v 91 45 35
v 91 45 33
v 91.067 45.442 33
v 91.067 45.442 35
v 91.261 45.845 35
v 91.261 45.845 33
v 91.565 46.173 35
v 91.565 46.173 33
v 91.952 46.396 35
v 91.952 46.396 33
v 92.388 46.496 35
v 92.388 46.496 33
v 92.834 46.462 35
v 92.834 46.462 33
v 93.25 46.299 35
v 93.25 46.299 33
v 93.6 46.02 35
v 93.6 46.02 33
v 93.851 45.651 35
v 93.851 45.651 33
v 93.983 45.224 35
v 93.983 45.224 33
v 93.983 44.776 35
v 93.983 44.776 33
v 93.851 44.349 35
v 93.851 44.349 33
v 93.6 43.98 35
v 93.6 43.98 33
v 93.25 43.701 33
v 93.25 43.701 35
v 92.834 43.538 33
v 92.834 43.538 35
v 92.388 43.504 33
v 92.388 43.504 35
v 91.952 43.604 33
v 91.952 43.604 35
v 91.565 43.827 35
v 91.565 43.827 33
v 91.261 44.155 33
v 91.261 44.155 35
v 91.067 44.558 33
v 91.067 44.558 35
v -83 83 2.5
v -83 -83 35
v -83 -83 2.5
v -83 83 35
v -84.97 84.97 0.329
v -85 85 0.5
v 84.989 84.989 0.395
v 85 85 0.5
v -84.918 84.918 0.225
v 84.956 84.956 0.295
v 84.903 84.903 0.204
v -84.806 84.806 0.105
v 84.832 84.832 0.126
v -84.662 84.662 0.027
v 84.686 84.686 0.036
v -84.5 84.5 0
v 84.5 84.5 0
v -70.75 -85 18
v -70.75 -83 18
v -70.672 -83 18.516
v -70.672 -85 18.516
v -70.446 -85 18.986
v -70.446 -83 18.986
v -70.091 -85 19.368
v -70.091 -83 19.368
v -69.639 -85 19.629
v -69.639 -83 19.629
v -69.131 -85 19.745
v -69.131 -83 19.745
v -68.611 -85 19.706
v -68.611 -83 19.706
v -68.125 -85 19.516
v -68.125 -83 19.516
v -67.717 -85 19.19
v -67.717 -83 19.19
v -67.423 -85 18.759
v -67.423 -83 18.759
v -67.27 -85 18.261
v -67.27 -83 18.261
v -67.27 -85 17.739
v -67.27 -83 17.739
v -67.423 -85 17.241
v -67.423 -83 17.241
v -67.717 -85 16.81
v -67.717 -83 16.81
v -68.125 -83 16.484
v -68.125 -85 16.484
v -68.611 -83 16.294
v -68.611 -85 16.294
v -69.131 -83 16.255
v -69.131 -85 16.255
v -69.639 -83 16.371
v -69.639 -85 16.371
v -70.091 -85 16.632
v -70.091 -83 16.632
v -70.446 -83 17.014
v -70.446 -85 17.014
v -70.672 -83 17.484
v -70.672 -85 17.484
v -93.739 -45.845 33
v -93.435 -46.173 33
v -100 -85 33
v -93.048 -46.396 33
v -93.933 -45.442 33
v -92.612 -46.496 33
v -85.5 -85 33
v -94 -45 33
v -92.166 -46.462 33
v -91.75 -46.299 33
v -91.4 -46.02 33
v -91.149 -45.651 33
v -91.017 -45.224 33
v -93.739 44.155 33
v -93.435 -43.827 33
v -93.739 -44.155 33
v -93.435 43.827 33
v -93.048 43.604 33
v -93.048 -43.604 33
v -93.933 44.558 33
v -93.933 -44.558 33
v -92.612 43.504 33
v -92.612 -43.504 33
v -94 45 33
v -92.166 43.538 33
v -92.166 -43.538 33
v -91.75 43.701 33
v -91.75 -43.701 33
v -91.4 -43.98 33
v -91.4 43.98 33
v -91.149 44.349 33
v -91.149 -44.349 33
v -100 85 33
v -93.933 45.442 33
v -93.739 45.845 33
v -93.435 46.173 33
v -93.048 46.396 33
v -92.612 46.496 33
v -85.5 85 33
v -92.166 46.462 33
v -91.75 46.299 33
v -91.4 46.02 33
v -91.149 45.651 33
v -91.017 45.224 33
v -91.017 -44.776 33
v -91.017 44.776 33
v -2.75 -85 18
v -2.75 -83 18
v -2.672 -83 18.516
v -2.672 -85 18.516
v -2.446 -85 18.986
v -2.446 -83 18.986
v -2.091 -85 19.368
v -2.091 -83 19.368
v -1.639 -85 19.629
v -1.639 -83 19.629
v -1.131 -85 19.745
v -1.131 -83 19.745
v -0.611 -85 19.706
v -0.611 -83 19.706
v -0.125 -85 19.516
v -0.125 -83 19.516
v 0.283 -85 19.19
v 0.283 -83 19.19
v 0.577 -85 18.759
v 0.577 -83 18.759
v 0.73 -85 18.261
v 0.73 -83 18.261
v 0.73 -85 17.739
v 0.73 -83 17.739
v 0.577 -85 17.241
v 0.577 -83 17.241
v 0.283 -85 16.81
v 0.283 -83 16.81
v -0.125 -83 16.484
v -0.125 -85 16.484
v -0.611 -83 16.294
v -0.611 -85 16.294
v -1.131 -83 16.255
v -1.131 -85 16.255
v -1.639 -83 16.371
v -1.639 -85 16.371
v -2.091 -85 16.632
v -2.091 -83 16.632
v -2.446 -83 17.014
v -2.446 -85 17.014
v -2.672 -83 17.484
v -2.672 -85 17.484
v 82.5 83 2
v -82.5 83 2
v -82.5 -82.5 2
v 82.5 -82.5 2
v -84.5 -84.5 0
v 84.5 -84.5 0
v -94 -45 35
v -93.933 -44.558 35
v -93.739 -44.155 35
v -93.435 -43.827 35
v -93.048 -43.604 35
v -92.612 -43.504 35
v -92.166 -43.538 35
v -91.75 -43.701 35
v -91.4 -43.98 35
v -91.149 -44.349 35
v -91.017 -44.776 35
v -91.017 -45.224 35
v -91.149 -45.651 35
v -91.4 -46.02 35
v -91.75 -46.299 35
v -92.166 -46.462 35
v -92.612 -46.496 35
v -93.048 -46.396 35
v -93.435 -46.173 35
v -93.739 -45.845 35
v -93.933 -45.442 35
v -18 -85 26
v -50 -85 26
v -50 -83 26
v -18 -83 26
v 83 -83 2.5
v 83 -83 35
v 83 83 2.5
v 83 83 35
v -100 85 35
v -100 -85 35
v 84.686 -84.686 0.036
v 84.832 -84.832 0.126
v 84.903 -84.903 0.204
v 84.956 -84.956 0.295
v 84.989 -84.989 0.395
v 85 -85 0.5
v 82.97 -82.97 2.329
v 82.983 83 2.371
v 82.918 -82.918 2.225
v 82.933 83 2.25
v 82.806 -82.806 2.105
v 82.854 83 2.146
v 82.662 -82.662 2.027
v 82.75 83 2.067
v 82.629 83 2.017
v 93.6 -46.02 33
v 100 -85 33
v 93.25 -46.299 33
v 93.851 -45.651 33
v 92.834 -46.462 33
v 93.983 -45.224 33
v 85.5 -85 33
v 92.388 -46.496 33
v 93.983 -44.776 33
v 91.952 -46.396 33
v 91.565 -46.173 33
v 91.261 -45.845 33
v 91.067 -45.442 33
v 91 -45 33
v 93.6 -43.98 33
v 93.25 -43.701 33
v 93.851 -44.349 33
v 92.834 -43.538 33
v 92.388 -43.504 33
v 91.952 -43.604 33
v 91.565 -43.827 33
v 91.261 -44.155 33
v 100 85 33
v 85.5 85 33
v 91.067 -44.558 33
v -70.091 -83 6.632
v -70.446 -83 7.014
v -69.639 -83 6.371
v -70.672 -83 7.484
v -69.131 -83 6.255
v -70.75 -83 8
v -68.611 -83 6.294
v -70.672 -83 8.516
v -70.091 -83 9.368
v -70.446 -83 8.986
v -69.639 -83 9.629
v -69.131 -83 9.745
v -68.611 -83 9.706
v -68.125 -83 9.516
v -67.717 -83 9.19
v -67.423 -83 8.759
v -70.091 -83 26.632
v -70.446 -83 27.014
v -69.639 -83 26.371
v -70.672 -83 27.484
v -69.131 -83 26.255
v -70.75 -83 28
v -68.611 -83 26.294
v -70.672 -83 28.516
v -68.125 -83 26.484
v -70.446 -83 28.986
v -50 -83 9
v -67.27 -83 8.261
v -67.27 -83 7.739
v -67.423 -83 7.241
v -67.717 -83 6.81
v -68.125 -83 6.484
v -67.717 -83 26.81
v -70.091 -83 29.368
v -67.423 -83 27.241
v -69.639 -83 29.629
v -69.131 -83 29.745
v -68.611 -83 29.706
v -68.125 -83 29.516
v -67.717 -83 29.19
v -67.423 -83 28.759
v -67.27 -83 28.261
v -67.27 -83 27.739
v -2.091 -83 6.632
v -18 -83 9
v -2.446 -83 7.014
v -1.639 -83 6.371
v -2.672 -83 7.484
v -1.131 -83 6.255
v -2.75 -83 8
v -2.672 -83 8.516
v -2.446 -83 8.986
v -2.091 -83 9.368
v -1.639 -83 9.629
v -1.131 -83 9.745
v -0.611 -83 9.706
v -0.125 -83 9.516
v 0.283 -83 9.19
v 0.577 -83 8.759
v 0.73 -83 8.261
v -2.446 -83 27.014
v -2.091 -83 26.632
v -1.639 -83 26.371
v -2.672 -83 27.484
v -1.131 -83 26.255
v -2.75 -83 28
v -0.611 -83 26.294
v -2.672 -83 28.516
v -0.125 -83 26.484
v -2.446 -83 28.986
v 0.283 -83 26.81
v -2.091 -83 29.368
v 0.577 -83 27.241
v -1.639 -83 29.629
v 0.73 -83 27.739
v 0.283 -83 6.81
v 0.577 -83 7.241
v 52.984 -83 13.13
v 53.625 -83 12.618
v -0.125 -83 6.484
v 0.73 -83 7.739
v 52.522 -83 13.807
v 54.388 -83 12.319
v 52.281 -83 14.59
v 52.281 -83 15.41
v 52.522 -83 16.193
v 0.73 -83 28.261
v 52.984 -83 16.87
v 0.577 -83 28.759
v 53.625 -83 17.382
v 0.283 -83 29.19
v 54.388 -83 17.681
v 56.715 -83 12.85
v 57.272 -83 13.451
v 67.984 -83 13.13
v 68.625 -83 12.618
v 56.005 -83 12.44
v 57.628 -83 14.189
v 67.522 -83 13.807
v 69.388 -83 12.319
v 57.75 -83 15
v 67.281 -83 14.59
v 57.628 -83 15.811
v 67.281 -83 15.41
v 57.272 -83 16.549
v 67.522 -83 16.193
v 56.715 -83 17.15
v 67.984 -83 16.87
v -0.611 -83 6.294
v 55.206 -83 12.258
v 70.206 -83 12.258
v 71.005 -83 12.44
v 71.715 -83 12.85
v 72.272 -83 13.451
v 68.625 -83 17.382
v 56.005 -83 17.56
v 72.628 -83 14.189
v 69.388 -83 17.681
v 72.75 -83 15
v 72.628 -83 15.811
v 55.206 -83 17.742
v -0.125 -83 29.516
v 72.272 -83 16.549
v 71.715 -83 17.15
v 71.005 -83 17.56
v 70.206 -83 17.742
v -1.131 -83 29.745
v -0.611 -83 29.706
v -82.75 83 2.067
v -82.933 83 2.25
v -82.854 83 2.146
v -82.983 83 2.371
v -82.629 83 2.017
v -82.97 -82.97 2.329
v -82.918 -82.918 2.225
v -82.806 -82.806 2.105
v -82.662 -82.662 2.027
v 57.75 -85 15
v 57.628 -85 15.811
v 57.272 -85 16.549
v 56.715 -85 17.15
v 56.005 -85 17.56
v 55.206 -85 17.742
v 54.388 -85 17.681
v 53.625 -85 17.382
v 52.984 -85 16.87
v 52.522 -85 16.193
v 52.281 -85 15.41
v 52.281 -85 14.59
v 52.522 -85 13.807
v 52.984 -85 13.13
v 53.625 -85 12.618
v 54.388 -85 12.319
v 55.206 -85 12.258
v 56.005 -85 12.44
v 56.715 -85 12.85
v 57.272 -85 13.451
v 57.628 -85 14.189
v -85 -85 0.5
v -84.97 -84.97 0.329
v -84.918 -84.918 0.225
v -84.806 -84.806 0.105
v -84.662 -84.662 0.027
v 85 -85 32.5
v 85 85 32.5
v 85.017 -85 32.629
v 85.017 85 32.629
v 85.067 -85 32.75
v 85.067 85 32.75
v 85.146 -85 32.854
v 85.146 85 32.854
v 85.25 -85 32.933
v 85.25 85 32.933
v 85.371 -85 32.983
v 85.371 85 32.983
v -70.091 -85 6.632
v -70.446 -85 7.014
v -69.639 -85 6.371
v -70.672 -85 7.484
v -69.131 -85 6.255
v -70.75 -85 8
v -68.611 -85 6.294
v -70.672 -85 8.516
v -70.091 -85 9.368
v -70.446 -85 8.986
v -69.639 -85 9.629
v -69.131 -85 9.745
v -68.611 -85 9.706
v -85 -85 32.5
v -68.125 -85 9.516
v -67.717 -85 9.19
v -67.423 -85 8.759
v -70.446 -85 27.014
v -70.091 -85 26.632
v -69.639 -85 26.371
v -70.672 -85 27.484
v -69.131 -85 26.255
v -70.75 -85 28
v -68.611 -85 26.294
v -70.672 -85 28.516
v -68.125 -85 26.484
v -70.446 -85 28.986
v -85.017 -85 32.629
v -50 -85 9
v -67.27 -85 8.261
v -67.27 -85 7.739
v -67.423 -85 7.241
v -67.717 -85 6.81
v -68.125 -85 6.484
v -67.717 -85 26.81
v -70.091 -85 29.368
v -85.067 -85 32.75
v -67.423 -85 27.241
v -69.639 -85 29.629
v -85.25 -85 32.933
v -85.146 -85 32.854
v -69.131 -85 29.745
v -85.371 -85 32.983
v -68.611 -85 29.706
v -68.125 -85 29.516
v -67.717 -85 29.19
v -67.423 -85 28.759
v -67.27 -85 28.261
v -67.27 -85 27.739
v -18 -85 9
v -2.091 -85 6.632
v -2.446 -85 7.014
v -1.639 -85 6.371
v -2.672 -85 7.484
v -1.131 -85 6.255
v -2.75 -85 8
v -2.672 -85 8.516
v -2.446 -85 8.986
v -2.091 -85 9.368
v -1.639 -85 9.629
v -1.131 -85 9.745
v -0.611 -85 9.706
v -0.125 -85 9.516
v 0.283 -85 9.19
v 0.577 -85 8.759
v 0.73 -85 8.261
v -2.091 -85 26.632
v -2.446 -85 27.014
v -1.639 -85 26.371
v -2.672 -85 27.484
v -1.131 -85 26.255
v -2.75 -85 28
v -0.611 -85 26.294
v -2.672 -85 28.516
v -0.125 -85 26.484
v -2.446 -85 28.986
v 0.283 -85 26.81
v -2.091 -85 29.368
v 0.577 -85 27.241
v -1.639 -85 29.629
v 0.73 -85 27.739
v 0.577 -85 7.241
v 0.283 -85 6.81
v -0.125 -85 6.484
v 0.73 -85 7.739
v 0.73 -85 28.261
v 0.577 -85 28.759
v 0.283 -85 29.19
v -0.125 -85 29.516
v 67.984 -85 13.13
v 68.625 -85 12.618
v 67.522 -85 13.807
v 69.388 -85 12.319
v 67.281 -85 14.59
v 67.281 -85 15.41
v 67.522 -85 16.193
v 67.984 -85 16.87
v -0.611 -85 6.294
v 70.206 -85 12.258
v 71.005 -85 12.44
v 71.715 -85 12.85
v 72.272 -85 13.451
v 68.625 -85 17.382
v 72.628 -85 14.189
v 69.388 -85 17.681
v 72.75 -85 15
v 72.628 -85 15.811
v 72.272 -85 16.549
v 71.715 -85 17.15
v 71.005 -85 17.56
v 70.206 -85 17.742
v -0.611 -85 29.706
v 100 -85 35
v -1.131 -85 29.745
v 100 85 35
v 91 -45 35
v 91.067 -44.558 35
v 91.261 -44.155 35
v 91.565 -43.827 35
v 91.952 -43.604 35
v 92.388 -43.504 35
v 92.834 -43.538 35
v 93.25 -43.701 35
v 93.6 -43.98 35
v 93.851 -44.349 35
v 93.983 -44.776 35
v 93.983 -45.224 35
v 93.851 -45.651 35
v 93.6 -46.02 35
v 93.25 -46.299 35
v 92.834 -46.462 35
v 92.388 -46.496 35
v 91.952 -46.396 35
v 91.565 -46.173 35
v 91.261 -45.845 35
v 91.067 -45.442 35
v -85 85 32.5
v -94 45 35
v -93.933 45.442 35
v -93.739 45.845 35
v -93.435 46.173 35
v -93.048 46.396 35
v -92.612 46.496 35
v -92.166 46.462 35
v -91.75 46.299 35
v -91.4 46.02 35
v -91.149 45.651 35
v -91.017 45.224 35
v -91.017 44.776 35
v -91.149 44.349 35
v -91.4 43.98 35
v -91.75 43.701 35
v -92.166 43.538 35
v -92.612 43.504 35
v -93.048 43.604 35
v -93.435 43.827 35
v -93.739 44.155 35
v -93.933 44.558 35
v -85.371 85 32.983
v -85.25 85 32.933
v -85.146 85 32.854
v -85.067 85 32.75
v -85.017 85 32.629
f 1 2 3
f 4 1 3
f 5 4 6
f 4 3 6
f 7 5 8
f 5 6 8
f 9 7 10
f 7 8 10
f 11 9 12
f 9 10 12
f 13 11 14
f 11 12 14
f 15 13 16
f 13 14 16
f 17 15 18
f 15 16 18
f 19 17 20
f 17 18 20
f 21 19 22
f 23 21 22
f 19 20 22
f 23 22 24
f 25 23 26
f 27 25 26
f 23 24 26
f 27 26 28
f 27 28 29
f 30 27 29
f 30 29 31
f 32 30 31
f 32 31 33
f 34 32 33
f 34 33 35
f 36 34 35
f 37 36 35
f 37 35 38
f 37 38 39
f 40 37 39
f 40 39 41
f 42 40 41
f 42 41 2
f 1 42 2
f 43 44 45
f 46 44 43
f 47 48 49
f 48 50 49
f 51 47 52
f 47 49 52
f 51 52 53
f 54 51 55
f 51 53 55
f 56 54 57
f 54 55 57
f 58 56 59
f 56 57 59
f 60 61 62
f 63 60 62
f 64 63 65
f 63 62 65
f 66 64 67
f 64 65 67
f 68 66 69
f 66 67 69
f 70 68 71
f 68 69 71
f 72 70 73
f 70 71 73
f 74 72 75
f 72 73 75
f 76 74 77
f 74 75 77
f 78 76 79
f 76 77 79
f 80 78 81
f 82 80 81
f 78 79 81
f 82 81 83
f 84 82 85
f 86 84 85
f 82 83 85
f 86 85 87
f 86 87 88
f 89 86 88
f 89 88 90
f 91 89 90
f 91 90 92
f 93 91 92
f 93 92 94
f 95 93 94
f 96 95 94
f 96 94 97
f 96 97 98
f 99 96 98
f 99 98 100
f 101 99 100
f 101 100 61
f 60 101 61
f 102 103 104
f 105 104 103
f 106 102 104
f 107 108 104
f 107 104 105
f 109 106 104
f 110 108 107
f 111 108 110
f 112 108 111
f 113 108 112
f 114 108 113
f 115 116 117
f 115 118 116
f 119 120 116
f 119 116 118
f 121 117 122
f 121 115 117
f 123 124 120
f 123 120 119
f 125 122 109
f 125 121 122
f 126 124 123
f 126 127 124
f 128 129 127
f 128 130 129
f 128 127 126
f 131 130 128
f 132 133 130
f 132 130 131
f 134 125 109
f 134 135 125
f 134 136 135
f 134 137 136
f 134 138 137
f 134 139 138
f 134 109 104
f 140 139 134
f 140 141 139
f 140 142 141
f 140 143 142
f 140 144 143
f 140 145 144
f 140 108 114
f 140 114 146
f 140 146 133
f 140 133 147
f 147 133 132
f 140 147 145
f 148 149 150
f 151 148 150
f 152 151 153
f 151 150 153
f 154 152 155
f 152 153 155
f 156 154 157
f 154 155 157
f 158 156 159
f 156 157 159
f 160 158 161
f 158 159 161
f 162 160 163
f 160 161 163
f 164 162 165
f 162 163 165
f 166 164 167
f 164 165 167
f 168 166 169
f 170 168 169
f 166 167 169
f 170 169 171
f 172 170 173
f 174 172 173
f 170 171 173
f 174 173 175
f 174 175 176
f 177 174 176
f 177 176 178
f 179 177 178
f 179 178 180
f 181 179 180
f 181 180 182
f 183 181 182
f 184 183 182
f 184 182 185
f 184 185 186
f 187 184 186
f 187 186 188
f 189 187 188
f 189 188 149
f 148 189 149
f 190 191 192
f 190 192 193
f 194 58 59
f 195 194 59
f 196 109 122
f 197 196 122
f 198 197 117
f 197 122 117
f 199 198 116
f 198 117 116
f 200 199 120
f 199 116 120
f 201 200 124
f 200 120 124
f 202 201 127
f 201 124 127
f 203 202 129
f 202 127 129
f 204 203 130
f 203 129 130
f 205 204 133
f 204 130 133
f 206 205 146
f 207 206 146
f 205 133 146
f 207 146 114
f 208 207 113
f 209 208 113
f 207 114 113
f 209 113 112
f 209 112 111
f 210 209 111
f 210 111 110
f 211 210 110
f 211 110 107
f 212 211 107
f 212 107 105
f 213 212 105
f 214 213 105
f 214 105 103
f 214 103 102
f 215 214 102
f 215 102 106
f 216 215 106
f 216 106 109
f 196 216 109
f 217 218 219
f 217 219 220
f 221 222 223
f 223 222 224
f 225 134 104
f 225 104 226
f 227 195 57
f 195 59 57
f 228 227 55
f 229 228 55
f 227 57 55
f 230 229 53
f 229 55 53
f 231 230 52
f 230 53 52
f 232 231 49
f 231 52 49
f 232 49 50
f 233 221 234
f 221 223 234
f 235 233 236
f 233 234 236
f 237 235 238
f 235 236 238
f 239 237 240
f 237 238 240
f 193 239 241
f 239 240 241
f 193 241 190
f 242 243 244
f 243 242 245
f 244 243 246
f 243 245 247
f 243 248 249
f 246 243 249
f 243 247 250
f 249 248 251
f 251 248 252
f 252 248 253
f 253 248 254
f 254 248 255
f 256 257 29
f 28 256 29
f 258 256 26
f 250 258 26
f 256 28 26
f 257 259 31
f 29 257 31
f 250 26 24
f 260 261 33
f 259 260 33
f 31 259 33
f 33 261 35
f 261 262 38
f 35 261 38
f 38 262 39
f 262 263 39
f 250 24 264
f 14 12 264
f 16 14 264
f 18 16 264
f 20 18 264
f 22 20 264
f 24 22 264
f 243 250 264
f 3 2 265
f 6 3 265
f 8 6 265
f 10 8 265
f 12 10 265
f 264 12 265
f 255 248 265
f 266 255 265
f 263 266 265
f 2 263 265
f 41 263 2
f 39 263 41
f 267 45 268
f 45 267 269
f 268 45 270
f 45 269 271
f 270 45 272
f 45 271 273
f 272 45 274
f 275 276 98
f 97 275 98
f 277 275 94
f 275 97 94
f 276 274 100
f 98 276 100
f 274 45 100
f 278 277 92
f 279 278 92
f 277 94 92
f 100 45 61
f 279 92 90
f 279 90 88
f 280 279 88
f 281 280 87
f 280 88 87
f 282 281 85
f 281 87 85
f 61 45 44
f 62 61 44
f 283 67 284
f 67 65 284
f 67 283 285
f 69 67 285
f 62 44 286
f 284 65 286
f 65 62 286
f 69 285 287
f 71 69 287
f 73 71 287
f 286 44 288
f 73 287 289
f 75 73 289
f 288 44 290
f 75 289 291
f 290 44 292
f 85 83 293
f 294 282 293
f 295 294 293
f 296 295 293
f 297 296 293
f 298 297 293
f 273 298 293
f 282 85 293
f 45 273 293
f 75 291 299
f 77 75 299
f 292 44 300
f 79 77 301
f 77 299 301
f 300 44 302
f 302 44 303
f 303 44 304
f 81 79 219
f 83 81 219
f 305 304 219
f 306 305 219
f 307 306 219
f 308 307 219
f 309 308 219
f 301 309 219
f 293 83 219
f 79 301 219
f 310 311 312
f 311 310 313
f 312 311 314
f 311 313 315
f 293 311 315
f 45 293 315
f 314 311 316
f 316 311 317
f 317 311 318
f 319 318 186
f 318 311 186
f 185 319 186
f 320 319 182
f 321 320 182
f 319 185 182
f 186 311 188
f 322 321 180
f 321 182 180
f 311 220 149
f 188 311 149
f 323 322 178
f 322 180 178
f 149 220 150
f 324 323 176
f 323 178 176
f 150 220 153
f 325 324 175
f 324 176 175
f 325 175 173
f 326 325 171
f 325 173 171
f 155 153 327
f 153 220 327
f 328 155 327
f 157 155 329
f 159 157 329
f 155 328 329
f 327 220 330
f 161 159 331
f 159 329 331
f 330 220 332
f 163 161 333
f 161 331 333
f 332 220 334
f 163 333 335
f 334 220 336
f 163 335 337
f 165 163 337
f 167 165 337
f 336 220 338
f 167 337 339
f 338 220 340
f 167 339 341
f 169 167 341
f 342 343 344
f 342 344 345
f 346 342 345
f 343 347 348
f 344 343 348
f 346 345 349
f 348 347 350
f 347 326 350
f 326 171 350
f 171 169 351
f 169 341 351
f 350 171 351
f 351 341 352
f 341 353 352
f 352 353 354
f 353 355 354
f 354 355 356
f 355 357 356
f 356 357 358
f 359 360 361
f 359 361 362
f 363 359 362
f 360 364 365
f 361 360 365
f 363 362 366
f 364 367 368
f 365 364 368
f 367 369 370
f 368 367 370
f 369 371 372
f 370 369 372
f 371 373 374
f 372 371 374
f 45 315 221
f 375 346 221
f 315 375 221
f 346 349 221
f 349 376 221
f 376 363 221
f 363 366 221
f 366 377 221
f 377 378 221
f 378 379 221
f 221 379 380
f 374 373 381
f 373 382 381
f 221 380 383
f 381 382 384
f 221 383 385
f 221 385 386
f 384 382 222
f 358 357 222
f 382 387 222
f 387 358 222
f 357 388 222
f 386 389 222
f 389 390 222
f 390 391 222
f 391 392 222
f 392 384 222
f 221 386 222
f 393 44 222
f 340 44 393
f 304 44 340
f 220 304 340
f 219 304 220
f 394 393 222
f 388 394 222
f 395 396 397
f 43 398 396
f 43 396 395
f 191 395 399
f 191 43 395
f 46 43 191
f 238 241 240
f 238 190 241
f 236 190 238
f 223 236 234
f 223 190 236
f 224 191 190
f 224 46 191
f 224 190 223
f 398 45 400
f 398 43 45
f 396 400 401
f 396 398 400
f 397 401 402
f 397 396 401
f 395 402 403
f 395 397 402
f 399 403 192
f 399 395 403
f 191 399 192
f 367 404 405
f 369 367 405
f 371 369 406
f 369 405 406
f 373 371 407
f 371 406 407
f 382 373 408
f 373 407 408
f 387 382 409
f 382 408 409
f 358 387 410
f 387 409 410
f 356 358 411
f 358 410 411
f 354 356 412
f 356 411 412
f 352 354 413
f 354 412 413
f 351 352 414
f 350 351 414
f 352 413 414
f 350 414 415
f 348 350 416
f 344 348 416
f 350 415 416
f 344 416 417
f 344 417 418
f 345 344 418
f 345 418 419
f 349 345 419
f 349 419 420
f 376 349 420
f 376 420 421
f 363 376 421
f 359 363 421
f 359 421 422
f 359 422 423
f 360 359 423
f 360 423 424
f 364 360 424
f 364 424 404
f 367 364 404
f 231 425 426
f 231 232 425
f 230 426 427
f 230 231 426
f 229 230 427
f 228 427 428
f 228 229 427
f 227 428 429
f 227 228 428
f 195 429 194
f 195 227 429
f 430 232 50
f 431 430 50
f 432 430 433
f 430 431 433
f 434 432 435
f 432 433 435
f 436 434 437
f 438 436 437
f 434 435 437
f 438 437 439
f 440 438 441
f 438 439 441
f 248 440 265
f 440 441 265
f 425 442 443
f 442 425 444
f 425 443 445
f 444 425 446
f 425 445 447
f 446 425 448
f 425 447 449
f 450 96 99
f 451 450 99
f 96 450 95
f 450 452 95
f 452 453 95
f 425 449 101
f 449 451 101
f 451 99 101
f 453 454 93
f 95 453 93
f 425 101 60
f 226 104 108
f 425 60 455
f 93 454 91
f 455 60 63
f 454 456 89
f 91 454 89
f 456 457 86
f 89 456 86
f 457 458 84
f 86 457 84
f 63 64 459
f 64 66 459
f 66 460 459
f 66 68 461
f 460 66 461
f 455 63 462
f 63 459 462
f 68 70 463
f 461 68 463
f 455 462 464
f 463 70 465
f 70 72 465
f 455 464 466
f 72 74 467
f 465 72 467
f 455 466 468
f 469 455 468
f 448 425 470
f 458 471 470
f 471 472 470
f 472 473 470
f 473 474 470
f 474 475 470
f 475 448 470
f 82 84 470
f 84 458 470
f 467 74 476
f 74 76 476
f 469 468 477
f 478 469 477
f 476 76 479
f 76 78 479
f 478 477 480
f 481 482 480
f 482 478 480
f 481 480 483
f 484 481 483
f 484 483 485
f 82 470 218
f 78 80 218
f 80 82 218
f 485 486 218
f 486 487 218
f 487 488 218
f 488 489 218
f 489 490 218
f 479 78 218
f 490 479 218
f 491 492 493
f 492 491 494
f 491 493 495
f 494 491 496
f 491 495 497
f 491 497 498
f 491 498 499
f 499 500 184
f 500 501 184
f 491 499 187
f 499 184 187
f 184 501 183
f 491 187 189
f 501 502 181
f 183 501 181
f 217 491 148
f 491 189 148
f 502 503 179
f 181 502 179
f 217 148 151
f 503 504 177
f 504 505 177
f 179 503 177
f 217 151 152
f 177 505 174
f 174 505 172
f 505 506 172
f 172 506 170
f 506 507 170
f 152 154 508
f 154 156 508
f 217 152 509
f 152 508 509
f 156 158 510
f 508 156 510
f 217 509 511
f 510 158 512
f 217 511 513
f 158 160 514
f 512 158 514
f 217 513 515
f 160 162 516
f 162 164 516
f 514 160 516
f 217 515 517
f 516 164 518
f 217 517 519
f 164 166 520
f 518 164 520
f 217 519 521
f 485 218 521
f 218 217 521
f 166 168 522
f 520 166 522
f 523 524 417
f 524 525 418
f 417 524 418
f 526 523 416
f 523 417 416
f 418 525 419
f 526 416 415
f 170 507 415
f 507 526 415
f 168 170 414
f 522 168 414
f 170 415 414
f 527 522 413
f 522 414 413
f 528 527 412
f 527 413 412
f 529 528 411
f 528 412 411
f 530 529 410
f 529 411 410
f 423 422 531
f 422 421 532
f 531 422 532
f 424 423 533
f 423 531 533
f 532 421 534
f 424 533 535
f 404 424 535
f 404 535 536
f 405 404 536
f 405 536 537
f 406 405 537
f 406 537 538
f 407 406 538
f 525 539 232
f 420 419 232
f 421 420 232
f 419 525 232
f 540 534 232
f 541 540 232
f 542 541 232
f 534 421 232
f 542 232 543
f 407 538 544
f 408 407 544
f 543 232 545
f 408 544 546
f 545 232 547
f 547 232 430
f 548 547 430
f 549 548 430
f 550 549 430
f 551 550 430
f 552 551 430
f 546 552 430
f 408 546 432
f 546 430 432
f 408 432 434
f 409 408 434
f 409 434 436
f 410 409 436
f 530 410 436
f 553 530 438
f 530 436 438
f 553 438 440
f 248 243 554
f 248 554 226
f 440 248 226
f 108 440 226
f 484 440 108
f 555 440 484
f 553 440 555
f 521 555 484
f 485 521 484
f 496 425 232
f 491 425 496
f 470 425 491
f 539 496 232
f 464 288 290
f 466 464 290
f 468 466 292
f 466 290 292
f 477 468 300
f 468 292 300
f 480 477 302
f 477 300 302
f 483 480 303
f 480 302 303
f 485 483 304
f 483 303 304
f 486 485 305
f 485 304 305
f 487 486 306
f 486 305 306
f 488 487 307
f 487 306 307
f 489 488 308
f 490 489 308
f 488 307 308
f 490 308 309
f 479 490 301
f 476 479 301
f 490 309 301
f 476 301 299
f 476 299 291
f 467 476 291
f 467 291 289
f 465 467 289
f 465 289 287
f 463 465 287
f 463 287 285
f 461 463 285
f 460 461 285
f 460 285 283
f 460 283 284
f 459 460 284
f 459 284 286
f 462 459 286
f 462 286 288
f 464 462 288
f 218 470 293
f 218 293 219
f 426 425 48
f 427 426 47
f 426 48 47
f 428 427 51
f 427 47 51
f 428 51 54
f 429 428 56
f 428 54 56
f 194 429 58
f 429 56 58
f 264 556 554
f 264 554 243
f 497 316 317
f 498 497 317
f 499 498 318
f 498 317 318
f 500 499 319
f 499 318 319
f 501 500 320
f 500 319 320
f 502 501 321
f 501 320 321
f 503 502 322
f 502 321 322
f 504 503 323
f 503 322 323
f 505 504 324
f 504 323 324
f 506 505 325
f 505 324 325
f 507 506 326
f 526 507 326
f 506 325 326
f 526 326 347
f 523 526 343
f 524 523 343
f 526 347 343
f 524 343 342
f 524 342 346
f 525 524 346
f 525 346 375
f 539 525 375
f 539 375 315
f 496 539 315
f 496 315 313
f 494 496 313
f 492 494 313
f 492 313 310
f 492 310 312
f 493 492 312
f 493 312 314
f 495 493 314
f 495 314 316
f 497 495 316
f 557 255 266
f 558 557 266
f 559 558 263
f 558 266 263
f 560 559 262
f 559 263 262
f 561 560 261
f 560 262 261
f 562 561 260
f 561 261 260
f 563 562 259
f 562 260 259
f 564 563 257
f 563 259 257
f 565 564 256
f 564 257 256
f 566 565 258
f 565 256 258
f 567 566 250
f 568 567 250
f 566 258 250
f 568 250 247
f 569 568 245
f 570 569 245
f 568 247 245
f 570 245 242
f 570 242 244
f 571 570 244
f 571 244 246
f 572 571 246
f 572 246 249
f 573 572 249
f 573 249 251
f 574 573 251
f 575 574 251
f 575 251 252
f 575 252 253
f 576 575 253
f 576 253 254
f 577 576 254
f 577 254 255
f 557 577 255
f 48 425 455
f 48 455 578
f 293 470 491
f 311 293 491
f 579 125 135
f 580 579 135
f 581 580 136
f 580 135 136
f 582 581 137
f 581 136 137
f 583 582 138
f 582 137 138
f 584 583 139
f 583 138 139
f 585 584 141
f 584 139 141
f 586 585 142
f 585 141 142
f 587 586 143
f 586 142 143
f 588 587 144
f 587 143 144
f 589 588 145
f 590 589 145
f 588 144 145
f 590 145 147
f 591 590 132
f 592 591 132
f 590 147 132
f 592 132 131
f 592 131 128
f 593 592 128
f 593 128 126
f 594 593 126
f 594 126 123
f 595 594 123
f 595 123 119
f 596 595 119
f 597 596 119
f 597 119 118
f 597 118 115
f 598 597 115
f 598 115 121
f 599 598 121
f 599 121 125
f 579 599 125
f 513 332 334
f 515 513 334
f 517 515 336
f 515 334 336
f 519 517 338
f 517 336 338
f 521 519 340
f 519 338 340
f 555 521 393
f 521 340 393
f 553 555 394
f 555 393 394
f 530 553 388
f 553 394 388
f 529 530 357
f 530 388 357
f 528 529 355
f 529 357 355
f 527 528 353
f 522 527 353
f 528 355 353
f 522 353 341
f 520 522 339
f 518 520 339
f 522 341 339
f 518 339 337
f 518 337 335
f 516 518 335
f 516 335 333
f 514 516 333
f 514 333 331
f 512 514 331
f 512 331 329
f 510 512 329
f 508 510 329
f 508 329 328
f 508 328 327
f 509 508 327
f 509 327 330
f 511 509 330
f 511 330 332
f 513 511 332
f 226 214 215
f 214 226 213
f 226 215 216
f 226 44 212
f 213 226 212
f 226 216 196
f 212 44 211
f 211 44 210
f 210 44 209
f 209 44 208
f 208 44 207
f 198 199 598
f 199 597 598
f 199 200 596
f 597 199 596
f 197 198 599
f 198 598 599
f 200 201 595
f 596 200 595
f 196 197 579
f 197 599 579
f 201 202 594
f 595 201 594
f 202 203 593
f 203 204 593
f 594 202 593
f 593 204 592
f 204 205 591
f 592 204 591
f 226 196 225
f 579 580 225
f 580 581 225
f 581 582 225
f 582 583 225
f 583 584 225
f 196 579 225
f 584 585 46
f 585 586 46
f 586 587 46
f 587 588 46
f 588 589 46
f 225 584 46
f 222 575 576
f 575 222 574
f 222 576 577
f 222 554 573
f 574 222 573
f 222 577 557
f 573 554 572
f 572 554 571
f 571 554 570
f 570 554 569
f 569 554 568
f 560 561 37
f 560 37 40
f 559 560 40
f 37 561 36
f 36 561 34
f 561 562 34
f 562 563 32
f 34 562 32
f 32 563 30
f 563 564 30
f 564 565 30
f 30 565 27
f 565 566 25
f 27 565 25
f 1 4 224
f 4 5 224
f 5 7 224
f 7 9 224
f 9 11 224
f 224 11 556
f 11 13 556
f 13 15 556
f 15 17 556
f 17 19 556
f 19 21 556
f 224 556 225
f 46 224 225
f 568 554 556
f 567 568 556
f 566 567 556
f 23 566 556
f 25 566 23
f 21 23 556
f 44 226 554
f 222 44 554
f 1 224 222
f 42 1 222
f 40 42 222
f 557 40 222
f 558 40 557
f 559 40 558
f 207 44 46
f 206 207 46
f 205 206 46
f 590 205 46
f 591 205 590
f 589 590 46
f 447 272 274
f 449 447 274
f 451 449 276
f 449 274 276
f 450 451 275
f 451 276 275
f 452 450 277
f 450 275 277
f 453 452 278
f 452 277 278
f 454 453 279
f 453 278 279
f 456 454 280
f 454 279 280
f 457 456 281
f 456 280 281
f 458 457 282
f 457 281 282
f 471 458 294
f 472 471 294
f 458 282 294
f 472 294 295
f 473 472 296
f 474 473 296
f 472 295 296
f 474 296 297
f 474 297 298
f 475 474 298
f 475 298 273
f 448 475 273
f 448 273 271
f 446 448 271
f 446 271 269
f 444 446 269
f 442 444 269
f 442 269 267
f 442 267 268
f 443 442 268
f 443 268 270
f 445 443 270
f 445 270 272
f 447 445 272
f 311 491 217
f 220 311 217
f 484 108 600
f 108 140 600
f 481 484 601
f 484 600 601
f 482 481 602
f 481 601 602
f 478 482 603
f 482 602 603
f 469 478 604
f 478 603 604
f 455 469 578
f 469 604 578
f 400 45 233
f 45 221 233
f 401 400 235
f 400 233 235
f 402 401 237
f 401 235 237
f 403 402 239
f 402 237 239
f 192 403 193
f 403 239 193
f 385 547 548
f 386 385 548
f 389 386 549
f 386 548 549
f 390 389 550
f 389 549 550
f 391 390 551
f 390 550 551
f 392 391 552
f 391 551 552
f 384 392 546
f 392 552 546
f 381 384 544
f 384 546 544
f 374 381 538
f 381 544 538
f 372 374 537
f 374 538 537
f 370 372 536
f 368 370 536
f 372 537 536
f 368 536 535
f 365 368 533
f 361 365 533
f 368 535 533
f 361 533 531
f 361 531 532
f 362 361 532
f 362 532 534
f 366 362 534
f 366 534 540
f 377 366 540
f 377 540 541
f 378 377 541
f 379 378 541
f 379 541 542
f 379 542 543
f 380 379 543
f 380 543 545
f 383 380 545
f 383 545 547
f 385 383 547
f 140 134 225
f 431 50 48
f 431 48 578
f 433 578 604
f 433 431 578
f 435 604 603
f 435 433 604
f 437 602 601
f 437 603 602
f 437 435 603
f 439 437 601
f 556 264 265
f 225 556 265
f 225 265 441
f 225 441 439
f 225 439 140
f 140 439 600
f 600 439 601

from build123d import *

# Parameters (mm, degrees)
SKETCH1_W                      = 170
SKETCH1_H                      = 170
BOSS_EXTRUDE1_DEPTH            = 35
SKETCH2_W                      = 166
SKETCH2_H                      = 166
CUT_EXTRUDE1_DEPTH             = 33
SKETCH3_W                      = 2
SKETCH3_H                      = 170
BOSS_EXTRUDE2_DEPTH            = 15
SKETCH4_W                      = 2
SKETCH4_H                      = 170
BOSS_EXTRUDE3_DEPTH            = 15
F_3_0_3_DIAMETER_HOLE1_D       = 3
F_3_0_3_DIAMETER_HOLE1_DEPTH   = 100
F_3_0_3_DIAMETER_HOLE1_TIP     = 0.901290929
SKETCH7_R                      = 2.75
SKETCH7_W                      = 32
SKETCH7_H                      = 17
CUT_EXTRUDE2_DEPTH             = 15
FILLET1_R                      = 0.5
F_3_5_3_5_DIAMETER_HOLE1_D     = 3.5
F_3_5_3_5_DIAMETER_HOLE1_DEPTH = 100
F_3_5_3_5_DIAMETER_HOLE1_TIP   = 1.051506083


with BuildPart() as part:
    # Sketch1 → Boss-Extrude1 (new body)
    with BuildSketch(Plane.XY):
        Rectangle(SKETCH1_W, SKETCH1_H)
    extrude(amount=BOSS_EXTRUDE1_DEPTH)

    # Sketch2 → Cut-Extrude1 (cut)
    with BuildSketch(Plane.XY.offset(35)):
        Rectangle(SKETCH2_W, SKETCH2_H)
    extrude(amount=-CUT_EXTRUDE1_DEPTH, mode=Mode.SUBTRACT)

    # Sketch3 → Boss-Extrude2 (add)
    with BuildSketch(Plane(origin=(85, 0, 0), x_dir=(0, 0, -1), z_dir=(1, 0, 0))):
        with Locations((-34, 0)):
            Rectangle(SKETCH3_W, SKETCH3_H)
    extrude(amount=BOSS_EXTRUDE2_DEPTH)

    # Sketch4 → Boss-Extrude3 (add)
    with BuildSketch(Plane.ZY.offset(85)):
        with Locations((34, 0)):
            Rectangle(SKETCH4_W, SKETCH4_H)
    extrude(amount=BOSS_EXTRUDE3_DEPTH)

    # Ø3.0 (3) Diameter Hole1
    with Locations(Plane.XY.offset(35)):
        with Locations((-92.5, 45), (-92.5, -45), (115, -45), (115, 45), (92.5, 45), (92.5, -45)):
            Hole(F_3_0_3_DIAMETER_HOLE1_D / 2, depth=F_3_0_3_DIAMETER_HOLE1_DEPTH)
            with Locations((0, 0, -(F_3_0_3_DIAMETER_HOLE1_DEPTH + F_3_0_3_DIAMETER_HOLE1_TIP / 2))):  # 118° drill point
                Cone(0, F_3_0_3_DIAMETER_HOLE1_D / 2, F_3_0_3_DIAMETER_HOLE1_TIP, mode=Mode.SUBTRACT)

    # Sketch7 → Cut-Extrude2 (cut)
    with BuildSketch(Plane.XZ.offset(85)):
        with Locations((55, 15)):
            Circle(SKETCH7_R)
        with Locations((70, 15)):
            Circle(SKETCH7_R)
        with Locations((-34, 17.5)):
            Rectangle(SKETCH7_W, SKETCH7_H)
    extrude(amount=-CUT_EXTRUDE2_DEPTH, mode=Mode.SUBTRACT)

    # Fillet1
    fillet1_edges = [part.edges().sort_by_distance(p)[0] for p in [
        (-83, 0, 2),
        (83, 0, 2),
        (85, 0, 0),
        (85, 0, 33),
        (-85, 0, 0),
        (-85, 0, 33),
        (0, -85, 0),
        (0, 85, 0),
        (0, -83, 2),
    ]]
    fillet(fillet1_edges, radius=FILLET1_R)

    # Ø3.5 (3.5) Diameter Hole1
    with Locations(Plane.XZ.offset(85)):
        with Locations((-69, 28), (-1, 28), (-69, 18), (-1, 18), (-69, 8), (-1, 8)):
            Hole(F_3_5_3_5_DIAMETER_HOLE1_D / 2, depth=F_3_5_3_5_DIAMETER_HOLE1_DEPTH)
            with Locations((0, 0, -(F_3_5_3_5_DIAMETER_HOLE1_DEPTH + F_3_5_3_5_DIAMETER_HOLE1_TIP / 2))):  # 118° drill point
                Cone(0, F_3_5_3_5_DIAMETER_HOLE1_D / 2, F_3_5_3_5_DIAMETER_HOLE1_TIP, mode=Mode.SUBTRACT)


solid = part.part
